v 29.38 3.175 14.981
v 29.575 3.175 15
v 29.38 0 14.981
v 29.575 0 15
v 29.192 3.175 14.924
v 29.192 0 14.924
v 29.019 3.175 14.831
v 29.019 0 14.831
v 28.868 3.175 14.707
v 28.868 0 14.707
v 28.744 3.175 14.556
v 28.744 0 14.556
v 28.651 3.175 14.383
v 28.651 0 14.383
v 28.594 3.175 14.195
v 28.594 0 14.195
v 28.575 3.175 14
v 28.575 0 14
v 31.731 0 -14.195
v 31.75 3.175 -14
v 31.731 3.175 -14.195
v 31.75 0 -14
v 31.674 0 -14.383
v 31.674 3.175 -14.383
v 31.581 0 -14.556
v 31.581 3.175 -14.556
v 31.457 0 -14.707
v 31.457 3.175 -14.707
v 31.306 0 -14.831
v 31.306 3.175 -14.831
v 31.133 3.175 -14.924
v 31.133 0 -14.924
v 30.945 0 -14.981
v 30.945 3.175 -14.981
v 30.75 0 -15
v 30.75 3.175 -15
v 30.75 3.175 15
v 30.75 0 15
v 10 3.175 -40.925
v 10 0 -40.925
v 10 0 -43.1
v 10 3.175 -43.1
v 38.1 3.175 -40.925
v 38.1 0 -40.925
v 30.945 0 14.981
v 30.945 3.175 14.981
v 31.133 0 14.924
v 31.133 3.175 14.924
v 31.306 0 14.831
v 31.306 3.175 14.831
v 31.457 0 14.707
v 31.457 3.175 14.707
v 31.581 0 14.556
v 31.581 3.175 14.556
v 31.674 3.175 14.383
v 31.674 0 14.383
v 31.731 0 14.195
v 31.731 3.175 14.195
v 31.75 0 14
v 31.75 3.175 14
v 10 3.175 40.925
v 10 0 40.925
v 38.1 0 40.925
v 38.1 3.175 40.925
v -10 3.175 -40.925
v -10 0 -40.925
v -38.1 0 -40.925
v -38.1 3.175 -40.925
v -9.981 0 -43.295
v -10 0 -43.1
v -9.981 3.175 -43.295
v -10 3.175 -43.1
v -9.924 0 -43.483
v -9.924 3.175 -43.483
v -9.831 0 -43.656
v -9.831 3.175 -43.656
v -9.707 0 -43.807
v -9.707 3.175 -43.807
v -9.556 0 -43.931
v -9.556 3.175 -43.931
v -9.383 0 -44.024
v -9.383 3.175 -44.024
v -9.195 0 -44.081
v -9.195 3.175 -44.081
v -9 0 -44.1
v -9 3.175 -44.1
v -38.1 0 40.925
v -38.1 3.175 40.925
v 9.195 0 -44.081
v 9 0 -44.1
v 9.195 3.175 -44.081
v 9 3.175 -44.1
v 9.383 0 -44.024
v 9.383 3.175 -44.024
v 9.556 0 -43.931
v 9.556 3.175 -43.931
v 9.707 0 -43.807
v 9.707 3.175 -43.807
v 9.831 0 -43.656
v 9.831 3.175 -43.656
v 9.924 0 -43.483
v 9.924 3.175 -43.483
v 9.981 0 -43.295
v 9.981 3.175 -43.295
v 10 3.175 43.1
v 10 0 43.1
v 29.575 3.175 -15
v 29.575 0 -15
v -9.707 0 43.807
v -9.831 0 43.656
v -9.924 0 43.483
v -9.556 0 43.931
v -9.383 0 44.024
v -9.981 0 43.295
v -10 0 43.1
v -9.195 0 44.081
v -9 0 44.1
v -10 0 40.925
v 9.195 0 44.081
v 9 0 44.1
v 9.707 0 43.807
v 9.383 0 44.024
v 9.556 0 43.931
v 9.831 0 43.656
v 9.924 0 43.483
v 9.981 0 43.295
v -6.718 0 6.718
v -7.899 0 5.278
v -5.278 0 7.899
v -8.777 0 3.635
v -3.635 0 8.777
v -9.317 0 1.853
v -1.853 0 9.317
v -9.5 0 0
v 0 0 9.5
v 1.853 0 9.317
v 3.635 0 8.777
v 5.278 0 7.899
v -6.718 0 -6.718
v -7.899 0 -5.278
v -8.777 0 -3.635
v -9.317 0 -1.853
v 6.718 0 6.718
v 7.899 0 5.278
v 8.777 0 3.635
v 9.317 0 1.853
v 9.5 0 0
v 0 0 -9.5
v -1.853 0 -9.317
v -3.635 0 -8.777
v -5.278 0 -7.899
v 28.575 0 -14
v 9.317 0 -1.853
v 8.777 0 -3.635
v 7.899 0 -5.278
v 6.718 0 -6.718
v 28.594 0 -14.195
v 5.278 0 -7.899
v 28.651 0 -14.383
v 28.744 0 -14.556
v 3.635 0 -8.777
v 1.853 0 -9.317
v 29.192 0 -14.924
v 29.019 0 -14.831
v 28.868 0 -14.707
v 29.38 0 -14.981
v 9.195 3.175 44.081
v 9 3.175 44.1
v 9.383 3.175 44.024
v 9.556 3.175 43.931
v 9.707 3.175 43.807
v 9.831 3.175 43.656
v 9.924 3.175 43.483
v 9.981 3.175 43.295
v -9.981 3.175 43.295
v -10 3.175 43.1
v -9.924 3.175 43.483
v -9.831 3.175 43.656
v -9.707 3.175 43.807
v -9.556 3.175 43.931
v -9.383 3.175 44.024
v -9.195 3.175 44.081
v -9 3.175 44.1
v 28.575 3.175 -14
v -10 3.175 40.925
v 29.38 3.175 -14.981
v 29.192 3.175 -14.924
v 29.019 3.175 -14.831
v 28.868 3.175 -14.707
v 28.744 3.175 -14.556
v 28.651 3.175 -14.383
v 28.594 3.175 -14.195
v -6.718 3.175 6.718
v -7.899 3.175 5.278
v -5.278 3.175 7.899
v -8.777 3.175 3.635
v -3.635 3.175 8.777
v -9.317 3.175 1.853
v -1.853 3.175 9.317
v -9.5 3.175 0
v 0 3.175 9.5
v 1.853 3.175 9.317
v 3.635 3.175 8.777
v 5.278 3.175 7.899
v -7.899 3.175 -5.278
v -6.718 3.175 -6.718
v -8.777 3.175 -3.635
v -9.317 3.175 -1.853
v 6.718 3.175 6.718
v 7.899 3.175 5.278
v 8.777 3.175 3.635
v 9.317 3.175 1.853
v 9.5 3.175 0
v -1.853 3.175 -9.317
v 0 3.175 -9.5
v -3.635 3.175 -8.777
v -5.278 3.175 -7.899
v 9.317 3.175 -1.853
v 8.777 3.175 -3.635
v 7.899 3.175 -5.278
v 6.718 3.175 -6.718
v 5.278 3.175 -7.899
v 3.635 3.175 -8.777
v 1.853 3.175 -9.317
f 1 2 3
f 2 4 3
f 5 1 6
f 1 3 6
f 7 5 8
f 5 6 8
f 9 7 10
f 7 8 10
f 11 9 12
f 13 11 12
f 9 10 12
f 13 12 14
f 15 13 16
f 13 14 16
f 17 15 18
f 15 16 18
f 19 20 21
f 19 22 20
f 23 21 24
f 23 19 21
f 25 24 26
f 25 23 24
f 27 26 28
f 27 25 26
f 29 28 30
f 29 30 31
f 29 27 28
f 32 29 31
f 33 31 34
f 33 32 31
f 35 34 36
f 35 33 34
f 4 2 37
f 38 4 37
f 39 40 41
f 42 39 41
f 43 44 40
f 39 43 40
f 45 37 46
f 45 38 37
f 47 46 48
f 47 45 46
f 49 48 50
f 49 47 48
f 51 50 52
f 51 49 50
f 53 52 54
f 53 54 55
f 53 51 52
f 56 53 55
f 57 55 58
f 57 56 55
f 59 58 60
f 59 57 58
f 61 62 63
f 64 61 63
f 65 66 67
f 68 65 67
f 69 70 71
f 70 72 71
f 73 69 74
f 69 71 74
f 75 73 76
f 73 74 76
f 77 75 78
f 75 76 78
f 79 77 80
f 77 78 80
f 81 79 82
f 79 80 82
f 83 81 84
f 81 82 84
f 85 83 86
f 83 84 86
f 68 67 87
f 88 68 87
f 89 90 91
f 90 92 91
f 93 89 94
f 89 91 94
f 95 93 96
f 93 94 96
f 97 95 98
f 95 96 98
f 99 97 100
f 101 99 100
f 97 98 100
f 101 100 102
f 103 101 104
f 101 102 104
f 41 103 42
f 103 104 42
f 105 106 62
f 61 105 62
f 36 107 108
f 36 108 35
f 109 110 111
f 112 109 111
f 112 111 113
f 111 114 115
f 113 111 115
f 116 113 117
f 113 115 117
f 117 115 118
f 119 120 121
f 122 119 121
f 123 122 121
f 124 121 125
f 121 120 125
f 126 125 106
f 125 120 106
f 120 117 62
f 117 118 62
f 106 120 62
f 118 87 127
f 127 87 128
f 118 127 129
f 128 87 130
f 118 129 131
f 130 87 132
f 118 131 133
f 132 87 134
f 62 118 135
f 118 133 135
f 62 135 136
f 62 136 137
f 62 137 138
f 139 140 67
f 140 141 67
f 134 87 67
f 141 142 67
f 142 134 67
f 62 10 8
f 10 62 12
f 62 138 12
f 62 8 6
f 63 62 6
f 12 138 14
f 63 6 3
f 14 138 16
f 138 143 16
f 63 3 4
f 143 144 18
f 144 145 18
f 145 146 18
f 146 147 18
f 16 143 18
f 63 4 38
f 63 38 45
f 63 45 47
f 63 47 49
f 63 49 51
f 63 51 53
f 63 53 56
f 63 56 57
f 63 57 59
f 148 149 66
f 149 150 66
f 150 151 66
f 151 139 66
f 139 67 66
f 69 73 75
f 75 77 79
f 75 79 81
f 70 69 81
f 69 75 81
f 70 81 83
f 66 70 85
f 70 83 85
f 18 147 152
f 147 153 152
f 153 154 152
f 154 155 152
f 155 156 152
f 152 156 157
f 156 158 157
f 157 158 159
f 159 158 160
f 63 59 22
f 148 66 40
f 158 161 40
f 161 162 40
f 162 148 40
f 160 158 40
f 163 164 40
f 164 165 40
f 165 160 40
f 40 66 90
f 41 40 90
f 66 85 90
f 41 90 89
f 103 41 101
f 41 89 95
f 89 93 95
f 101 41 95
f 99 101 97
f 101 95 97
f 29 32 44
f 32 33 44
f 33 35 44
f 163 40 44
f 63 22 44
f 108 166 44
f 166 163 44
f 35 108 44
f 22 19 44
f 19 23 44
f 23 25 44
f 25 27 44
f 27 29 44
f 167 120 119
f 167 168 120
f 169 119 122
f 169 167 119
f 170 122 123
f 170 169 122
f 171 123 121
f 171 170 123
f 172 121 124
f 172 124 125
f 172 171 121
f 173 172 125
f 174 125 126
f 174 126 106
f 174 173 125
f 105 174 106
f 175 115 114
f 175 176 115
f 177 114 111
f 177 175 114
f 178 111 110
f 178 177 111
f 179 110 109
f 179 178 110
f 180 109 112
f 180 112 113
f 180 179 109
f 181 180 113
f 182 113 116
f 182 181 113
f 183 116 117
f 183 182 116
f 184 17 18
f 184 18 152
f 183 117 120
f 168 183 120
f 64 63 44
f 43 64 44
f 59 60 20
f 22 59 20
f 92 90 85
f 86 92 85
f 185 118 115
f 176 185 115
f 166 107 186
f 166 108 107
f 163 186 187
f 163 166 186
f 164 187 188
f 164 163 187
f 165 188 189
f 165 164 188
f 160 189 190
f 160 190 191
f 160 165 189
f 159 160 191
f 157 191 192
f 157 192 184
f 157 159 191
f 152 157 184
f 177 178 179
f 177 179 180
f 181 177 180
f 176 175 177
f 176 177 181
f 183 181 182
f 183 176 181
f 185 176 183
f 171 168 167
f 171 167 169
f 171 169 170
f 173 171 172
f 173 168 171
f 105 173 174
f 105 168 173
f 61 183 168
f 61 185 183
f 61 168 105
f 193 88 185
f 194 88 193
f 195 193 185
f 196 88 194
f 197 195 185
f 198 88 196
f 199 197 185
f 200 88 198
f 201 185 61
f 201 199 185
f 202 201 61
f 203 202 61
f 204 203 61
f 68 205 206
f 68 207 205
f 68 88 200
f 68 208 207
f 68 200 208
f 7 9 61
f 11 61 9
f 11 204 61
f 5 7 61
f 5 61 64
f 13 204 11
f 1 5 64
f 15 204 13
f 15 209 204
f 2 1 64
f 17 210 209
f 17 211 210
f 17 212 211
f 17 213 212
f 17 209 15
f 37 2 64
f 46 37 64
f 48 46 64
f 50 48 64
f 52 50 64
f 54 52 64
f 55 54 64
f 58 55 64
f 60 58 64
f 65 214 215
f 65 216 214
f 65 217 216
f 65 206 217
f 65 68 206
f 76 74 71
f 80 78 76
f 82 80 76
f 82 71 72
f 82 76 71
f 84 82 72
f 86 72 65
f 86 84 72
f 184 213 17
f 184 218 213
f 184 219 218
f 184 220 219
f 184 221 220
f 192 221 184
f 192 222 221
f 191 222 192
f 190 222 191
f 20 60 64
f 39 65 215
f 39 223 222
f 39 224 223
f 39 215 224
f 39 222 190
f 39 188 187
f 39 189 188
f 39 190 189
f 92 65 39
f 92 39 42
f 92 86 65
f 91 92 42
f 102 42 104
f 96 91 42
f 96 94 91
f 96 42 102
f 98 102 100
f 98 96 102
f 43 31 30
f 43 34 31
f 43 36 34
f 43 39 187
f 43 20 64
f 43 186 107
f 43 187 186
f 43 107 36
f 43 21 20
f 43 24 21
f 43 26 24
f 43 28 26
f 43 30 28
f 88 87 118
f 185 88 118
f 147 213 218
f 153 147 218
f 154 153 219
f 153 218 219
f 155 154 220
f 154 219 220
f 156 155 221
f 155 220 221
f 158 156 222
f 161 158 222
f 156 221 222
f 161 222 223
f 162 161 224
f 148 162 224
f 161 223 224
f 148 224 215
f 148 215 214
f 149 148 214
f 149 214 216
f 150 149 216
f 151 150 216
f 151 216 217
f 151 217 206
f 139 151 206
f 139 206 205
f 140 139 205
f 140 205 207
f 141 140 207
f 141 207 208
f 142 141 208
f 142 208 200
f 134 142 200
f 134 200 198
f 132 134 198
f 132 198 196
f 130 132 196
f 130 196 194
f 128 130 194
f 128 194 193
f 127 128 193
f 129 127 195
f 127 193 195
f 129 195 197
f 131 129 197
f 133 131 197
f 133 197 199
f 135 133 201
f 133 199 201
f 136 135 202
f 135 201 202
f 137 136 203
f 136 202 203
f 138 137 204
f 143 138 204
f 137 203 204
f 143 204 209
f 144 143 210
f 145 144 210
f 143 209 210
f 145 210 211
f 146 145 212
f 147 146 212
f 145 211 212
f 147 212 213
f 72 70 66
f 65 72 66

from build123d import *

# Parameters (mm, degrees)
BOSS_EXTRUDE1_DEPTH = 3.175
SKETCH2_R           = 9.5
SKETCH2_W           = 3.175
SKETCH2_H           = 30
CUT_EXTRUDE1_DEPTH  = 4.175
FILLET1_R           = 1


with BuildPart() as part:
    # Sketch1 → Boss-Extrude1 (new body)
    with BuildSketch(Plane(origin=(0, 0, 0), x_dir=(1, 0, 0), z_dir=(0, 1, 0))):
        Polygon((-38.1, -40.925), (-10, -40.925), (-10, -44.1), (10, -44.1), (10, -40.925), (38.1, -40.925), (38.1, 40.925), (10, 40.925), (10, 44.1), (-10, 44.1), (-10, 40.925), (-38.1, 40.925), align=None)
    extrude(amount=BOSS_EXTRUDE1_DEPTH)

    # Sketch2 → Cut-Extrude1 (cut, through all)
    with BuildSketch(Plane(origin=(0, 3.175, 0), x_dir=(1, 0, 0), z_dir=(0, 1, 0))):
        Circle(SKETCH2_R)
        with Locations((30.1625, 0)):
            Rectangle(SKETCH2_W, SKETCH2_H)
    extrude(amount=-CUT_EXTRUDE1_DEPTH, mode=Mode.SUBTRACT)

    # Fillet1
    fillet1_edges = [part.edges().sort_by_distance(p)[0] for p in [
        (10, 1.5875, 44.1),
        (-10, 1.5875, 44.1),
        (-10, 1.5875, -44.1),
        (10, 1.5875, -44.1),
        (28.575, 1.5875, 15),
        (28.575, 1.5875, -15),
        (31.75, 1.5875, -15),
        (31.75, 1.5875, 15),
    ]]
    fillet(fillet1_edges, radius=FILLET1_R)


solid = part.part
